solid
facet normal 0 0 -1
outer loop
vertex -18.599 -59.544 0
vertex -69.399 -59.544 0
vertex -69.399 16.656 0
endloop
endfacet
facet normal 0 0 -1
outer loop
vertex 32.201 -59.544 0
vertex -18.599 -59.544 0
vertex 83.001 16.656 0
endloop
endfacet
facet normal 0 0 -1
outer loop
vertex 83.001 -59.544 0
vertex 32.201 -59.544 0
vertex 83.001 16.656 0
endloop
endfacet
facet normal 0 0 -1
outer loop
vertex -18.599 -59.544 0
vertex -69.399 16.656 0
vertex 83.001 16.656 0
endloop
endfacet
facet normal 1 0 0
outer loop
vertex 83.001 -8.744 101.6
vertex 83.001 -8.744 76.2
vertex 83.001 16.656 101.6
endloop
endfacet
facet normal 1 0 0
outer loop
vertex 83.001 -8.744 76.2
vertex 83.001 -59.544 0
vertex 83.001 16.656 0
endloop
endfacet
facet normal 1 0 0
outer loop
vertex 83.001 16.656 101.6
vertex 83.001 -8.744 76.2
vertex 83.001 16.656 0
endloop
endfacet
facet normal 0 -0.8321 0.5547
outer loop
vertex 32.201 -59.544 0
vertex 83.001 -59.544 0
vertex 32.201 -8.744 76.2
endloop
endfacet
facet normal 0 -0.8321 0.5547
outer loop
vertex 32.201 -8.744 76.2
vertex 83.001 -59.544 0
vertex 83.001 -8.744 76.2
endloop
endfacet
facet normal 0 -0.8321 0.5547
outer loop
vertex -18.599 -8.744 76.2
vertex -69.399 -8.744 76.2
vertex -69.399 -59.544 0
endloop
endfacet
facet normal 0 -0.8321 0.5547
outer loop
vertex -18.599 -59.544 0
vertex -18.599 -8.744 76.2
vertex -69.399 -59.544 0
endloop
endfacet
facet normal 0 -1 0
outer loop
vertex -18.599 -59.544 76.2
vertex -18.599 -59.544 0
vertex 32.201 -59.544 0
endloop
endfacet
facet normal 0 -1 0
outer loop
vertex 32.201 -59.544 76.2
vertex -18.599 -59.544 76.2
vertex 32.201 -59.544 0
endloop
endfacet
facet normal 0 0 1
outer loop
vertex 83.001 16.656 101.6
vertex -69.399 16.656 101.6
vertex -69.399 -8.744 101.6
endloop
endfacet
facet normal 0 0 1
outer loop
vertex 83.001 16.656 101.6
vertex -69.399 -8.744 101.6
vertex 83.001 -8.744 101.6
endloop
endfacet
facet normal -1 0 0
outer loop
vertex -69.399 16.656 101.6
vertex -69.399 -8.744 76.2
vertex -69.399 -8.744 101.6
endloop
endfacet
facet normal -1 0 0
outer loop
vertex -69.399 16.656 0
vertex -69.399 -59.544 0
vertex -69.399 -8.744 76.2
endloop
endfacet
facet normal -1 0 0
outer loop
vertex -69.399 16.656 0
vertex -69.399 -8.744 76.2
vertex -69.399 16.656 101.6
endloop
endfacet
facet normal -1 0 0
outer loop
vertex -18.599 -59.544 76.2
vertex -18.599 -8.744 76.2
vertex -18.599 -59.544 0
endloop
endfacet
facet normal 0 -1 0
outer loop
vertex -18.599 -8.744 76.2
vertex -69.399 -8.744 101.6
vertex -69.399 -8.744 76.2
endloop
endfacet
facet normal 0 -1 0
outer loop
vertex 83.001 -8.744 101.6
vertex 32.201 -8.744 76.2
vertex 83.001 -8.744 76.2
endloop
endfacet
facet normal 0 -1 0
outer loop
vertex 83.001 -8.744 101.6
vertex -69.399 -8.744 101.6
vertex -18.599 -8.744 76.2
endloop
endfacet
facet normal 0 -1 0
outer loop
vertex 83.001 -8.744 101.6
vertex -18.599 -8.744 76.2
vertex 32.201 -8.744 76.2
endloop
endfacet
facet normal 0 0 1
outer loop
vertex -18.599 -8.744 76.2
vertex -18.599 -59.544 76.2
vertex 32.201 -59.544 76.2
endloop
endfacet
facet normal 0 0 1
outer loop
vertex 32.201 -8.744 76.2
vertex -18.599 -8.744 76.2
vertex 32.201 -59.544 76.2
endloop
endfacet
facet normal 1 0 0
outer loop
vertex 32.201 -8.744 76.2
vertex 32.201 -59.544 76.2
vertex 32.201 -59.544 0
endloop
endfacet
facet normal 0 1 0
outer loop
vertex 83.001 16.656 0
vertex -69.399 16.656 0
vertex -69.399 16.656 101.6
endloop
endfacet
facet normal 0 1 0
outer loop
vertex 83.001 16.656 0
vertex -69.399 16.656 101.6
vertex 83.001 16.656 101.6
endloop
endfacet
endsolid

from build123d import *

# Parameters (mm, degrees)
F0_W     = 152.4
F0_H     = 76.2
F1_DEPTH = 101.6
F4_DEPTH = 50.8
F5_DEPTH = 50.8
F7_DEPTH = 50.8


with BuildPart() as f1:
    # F0 (on Top) → F1 (new body)
    with BuildSketch(Plane.XY):
        with Locations((6.801184, -21.443818)):
            Rectangle(F0_W, F0_H)
    extrude(amount=F1_DEPTH)

    # F3 (on face) → F4 (cut)
    with BuildSketch(Plane.XZ.offset(59.543818)):
        Polygon((-69.398816, 101.6), (-69.398816, 76.2), (-18.598816, 76.2), (32.201184, 76.2), (83.001184, 76.2), (83.001184, 101.6), align=None)
    extrude(amount=-F4_DEPTH, mode=Mode.SUBTRACT)

    # F2 (on face) → F5 (cut)
    with BuildSketch(Plane.YZ.offset(83.001184)):
        Polygon((-59.543818, 0), (-8.743818, 76.2), (-8.743818, 101.6), (-59.543818, 101.6), align=None)
    extrude(amount=-F5_DEPTH, mode=Mode.SUBTRACT)

    # F6 (on face) → F7 (cut)
    with BuildSketch(Plane(origin=(-69.398816, 0, 0), x_dir=(0, -1, 0), z_dir=(-1, 0, 0))):
        Polygon((59.543818, 76.2), (8.743818, 76.2), (59.543818, 0), align=None)
    extrude(amount=-F7_DEPTH, mode=Mode.SUBTRACT)


solid = f1.part
